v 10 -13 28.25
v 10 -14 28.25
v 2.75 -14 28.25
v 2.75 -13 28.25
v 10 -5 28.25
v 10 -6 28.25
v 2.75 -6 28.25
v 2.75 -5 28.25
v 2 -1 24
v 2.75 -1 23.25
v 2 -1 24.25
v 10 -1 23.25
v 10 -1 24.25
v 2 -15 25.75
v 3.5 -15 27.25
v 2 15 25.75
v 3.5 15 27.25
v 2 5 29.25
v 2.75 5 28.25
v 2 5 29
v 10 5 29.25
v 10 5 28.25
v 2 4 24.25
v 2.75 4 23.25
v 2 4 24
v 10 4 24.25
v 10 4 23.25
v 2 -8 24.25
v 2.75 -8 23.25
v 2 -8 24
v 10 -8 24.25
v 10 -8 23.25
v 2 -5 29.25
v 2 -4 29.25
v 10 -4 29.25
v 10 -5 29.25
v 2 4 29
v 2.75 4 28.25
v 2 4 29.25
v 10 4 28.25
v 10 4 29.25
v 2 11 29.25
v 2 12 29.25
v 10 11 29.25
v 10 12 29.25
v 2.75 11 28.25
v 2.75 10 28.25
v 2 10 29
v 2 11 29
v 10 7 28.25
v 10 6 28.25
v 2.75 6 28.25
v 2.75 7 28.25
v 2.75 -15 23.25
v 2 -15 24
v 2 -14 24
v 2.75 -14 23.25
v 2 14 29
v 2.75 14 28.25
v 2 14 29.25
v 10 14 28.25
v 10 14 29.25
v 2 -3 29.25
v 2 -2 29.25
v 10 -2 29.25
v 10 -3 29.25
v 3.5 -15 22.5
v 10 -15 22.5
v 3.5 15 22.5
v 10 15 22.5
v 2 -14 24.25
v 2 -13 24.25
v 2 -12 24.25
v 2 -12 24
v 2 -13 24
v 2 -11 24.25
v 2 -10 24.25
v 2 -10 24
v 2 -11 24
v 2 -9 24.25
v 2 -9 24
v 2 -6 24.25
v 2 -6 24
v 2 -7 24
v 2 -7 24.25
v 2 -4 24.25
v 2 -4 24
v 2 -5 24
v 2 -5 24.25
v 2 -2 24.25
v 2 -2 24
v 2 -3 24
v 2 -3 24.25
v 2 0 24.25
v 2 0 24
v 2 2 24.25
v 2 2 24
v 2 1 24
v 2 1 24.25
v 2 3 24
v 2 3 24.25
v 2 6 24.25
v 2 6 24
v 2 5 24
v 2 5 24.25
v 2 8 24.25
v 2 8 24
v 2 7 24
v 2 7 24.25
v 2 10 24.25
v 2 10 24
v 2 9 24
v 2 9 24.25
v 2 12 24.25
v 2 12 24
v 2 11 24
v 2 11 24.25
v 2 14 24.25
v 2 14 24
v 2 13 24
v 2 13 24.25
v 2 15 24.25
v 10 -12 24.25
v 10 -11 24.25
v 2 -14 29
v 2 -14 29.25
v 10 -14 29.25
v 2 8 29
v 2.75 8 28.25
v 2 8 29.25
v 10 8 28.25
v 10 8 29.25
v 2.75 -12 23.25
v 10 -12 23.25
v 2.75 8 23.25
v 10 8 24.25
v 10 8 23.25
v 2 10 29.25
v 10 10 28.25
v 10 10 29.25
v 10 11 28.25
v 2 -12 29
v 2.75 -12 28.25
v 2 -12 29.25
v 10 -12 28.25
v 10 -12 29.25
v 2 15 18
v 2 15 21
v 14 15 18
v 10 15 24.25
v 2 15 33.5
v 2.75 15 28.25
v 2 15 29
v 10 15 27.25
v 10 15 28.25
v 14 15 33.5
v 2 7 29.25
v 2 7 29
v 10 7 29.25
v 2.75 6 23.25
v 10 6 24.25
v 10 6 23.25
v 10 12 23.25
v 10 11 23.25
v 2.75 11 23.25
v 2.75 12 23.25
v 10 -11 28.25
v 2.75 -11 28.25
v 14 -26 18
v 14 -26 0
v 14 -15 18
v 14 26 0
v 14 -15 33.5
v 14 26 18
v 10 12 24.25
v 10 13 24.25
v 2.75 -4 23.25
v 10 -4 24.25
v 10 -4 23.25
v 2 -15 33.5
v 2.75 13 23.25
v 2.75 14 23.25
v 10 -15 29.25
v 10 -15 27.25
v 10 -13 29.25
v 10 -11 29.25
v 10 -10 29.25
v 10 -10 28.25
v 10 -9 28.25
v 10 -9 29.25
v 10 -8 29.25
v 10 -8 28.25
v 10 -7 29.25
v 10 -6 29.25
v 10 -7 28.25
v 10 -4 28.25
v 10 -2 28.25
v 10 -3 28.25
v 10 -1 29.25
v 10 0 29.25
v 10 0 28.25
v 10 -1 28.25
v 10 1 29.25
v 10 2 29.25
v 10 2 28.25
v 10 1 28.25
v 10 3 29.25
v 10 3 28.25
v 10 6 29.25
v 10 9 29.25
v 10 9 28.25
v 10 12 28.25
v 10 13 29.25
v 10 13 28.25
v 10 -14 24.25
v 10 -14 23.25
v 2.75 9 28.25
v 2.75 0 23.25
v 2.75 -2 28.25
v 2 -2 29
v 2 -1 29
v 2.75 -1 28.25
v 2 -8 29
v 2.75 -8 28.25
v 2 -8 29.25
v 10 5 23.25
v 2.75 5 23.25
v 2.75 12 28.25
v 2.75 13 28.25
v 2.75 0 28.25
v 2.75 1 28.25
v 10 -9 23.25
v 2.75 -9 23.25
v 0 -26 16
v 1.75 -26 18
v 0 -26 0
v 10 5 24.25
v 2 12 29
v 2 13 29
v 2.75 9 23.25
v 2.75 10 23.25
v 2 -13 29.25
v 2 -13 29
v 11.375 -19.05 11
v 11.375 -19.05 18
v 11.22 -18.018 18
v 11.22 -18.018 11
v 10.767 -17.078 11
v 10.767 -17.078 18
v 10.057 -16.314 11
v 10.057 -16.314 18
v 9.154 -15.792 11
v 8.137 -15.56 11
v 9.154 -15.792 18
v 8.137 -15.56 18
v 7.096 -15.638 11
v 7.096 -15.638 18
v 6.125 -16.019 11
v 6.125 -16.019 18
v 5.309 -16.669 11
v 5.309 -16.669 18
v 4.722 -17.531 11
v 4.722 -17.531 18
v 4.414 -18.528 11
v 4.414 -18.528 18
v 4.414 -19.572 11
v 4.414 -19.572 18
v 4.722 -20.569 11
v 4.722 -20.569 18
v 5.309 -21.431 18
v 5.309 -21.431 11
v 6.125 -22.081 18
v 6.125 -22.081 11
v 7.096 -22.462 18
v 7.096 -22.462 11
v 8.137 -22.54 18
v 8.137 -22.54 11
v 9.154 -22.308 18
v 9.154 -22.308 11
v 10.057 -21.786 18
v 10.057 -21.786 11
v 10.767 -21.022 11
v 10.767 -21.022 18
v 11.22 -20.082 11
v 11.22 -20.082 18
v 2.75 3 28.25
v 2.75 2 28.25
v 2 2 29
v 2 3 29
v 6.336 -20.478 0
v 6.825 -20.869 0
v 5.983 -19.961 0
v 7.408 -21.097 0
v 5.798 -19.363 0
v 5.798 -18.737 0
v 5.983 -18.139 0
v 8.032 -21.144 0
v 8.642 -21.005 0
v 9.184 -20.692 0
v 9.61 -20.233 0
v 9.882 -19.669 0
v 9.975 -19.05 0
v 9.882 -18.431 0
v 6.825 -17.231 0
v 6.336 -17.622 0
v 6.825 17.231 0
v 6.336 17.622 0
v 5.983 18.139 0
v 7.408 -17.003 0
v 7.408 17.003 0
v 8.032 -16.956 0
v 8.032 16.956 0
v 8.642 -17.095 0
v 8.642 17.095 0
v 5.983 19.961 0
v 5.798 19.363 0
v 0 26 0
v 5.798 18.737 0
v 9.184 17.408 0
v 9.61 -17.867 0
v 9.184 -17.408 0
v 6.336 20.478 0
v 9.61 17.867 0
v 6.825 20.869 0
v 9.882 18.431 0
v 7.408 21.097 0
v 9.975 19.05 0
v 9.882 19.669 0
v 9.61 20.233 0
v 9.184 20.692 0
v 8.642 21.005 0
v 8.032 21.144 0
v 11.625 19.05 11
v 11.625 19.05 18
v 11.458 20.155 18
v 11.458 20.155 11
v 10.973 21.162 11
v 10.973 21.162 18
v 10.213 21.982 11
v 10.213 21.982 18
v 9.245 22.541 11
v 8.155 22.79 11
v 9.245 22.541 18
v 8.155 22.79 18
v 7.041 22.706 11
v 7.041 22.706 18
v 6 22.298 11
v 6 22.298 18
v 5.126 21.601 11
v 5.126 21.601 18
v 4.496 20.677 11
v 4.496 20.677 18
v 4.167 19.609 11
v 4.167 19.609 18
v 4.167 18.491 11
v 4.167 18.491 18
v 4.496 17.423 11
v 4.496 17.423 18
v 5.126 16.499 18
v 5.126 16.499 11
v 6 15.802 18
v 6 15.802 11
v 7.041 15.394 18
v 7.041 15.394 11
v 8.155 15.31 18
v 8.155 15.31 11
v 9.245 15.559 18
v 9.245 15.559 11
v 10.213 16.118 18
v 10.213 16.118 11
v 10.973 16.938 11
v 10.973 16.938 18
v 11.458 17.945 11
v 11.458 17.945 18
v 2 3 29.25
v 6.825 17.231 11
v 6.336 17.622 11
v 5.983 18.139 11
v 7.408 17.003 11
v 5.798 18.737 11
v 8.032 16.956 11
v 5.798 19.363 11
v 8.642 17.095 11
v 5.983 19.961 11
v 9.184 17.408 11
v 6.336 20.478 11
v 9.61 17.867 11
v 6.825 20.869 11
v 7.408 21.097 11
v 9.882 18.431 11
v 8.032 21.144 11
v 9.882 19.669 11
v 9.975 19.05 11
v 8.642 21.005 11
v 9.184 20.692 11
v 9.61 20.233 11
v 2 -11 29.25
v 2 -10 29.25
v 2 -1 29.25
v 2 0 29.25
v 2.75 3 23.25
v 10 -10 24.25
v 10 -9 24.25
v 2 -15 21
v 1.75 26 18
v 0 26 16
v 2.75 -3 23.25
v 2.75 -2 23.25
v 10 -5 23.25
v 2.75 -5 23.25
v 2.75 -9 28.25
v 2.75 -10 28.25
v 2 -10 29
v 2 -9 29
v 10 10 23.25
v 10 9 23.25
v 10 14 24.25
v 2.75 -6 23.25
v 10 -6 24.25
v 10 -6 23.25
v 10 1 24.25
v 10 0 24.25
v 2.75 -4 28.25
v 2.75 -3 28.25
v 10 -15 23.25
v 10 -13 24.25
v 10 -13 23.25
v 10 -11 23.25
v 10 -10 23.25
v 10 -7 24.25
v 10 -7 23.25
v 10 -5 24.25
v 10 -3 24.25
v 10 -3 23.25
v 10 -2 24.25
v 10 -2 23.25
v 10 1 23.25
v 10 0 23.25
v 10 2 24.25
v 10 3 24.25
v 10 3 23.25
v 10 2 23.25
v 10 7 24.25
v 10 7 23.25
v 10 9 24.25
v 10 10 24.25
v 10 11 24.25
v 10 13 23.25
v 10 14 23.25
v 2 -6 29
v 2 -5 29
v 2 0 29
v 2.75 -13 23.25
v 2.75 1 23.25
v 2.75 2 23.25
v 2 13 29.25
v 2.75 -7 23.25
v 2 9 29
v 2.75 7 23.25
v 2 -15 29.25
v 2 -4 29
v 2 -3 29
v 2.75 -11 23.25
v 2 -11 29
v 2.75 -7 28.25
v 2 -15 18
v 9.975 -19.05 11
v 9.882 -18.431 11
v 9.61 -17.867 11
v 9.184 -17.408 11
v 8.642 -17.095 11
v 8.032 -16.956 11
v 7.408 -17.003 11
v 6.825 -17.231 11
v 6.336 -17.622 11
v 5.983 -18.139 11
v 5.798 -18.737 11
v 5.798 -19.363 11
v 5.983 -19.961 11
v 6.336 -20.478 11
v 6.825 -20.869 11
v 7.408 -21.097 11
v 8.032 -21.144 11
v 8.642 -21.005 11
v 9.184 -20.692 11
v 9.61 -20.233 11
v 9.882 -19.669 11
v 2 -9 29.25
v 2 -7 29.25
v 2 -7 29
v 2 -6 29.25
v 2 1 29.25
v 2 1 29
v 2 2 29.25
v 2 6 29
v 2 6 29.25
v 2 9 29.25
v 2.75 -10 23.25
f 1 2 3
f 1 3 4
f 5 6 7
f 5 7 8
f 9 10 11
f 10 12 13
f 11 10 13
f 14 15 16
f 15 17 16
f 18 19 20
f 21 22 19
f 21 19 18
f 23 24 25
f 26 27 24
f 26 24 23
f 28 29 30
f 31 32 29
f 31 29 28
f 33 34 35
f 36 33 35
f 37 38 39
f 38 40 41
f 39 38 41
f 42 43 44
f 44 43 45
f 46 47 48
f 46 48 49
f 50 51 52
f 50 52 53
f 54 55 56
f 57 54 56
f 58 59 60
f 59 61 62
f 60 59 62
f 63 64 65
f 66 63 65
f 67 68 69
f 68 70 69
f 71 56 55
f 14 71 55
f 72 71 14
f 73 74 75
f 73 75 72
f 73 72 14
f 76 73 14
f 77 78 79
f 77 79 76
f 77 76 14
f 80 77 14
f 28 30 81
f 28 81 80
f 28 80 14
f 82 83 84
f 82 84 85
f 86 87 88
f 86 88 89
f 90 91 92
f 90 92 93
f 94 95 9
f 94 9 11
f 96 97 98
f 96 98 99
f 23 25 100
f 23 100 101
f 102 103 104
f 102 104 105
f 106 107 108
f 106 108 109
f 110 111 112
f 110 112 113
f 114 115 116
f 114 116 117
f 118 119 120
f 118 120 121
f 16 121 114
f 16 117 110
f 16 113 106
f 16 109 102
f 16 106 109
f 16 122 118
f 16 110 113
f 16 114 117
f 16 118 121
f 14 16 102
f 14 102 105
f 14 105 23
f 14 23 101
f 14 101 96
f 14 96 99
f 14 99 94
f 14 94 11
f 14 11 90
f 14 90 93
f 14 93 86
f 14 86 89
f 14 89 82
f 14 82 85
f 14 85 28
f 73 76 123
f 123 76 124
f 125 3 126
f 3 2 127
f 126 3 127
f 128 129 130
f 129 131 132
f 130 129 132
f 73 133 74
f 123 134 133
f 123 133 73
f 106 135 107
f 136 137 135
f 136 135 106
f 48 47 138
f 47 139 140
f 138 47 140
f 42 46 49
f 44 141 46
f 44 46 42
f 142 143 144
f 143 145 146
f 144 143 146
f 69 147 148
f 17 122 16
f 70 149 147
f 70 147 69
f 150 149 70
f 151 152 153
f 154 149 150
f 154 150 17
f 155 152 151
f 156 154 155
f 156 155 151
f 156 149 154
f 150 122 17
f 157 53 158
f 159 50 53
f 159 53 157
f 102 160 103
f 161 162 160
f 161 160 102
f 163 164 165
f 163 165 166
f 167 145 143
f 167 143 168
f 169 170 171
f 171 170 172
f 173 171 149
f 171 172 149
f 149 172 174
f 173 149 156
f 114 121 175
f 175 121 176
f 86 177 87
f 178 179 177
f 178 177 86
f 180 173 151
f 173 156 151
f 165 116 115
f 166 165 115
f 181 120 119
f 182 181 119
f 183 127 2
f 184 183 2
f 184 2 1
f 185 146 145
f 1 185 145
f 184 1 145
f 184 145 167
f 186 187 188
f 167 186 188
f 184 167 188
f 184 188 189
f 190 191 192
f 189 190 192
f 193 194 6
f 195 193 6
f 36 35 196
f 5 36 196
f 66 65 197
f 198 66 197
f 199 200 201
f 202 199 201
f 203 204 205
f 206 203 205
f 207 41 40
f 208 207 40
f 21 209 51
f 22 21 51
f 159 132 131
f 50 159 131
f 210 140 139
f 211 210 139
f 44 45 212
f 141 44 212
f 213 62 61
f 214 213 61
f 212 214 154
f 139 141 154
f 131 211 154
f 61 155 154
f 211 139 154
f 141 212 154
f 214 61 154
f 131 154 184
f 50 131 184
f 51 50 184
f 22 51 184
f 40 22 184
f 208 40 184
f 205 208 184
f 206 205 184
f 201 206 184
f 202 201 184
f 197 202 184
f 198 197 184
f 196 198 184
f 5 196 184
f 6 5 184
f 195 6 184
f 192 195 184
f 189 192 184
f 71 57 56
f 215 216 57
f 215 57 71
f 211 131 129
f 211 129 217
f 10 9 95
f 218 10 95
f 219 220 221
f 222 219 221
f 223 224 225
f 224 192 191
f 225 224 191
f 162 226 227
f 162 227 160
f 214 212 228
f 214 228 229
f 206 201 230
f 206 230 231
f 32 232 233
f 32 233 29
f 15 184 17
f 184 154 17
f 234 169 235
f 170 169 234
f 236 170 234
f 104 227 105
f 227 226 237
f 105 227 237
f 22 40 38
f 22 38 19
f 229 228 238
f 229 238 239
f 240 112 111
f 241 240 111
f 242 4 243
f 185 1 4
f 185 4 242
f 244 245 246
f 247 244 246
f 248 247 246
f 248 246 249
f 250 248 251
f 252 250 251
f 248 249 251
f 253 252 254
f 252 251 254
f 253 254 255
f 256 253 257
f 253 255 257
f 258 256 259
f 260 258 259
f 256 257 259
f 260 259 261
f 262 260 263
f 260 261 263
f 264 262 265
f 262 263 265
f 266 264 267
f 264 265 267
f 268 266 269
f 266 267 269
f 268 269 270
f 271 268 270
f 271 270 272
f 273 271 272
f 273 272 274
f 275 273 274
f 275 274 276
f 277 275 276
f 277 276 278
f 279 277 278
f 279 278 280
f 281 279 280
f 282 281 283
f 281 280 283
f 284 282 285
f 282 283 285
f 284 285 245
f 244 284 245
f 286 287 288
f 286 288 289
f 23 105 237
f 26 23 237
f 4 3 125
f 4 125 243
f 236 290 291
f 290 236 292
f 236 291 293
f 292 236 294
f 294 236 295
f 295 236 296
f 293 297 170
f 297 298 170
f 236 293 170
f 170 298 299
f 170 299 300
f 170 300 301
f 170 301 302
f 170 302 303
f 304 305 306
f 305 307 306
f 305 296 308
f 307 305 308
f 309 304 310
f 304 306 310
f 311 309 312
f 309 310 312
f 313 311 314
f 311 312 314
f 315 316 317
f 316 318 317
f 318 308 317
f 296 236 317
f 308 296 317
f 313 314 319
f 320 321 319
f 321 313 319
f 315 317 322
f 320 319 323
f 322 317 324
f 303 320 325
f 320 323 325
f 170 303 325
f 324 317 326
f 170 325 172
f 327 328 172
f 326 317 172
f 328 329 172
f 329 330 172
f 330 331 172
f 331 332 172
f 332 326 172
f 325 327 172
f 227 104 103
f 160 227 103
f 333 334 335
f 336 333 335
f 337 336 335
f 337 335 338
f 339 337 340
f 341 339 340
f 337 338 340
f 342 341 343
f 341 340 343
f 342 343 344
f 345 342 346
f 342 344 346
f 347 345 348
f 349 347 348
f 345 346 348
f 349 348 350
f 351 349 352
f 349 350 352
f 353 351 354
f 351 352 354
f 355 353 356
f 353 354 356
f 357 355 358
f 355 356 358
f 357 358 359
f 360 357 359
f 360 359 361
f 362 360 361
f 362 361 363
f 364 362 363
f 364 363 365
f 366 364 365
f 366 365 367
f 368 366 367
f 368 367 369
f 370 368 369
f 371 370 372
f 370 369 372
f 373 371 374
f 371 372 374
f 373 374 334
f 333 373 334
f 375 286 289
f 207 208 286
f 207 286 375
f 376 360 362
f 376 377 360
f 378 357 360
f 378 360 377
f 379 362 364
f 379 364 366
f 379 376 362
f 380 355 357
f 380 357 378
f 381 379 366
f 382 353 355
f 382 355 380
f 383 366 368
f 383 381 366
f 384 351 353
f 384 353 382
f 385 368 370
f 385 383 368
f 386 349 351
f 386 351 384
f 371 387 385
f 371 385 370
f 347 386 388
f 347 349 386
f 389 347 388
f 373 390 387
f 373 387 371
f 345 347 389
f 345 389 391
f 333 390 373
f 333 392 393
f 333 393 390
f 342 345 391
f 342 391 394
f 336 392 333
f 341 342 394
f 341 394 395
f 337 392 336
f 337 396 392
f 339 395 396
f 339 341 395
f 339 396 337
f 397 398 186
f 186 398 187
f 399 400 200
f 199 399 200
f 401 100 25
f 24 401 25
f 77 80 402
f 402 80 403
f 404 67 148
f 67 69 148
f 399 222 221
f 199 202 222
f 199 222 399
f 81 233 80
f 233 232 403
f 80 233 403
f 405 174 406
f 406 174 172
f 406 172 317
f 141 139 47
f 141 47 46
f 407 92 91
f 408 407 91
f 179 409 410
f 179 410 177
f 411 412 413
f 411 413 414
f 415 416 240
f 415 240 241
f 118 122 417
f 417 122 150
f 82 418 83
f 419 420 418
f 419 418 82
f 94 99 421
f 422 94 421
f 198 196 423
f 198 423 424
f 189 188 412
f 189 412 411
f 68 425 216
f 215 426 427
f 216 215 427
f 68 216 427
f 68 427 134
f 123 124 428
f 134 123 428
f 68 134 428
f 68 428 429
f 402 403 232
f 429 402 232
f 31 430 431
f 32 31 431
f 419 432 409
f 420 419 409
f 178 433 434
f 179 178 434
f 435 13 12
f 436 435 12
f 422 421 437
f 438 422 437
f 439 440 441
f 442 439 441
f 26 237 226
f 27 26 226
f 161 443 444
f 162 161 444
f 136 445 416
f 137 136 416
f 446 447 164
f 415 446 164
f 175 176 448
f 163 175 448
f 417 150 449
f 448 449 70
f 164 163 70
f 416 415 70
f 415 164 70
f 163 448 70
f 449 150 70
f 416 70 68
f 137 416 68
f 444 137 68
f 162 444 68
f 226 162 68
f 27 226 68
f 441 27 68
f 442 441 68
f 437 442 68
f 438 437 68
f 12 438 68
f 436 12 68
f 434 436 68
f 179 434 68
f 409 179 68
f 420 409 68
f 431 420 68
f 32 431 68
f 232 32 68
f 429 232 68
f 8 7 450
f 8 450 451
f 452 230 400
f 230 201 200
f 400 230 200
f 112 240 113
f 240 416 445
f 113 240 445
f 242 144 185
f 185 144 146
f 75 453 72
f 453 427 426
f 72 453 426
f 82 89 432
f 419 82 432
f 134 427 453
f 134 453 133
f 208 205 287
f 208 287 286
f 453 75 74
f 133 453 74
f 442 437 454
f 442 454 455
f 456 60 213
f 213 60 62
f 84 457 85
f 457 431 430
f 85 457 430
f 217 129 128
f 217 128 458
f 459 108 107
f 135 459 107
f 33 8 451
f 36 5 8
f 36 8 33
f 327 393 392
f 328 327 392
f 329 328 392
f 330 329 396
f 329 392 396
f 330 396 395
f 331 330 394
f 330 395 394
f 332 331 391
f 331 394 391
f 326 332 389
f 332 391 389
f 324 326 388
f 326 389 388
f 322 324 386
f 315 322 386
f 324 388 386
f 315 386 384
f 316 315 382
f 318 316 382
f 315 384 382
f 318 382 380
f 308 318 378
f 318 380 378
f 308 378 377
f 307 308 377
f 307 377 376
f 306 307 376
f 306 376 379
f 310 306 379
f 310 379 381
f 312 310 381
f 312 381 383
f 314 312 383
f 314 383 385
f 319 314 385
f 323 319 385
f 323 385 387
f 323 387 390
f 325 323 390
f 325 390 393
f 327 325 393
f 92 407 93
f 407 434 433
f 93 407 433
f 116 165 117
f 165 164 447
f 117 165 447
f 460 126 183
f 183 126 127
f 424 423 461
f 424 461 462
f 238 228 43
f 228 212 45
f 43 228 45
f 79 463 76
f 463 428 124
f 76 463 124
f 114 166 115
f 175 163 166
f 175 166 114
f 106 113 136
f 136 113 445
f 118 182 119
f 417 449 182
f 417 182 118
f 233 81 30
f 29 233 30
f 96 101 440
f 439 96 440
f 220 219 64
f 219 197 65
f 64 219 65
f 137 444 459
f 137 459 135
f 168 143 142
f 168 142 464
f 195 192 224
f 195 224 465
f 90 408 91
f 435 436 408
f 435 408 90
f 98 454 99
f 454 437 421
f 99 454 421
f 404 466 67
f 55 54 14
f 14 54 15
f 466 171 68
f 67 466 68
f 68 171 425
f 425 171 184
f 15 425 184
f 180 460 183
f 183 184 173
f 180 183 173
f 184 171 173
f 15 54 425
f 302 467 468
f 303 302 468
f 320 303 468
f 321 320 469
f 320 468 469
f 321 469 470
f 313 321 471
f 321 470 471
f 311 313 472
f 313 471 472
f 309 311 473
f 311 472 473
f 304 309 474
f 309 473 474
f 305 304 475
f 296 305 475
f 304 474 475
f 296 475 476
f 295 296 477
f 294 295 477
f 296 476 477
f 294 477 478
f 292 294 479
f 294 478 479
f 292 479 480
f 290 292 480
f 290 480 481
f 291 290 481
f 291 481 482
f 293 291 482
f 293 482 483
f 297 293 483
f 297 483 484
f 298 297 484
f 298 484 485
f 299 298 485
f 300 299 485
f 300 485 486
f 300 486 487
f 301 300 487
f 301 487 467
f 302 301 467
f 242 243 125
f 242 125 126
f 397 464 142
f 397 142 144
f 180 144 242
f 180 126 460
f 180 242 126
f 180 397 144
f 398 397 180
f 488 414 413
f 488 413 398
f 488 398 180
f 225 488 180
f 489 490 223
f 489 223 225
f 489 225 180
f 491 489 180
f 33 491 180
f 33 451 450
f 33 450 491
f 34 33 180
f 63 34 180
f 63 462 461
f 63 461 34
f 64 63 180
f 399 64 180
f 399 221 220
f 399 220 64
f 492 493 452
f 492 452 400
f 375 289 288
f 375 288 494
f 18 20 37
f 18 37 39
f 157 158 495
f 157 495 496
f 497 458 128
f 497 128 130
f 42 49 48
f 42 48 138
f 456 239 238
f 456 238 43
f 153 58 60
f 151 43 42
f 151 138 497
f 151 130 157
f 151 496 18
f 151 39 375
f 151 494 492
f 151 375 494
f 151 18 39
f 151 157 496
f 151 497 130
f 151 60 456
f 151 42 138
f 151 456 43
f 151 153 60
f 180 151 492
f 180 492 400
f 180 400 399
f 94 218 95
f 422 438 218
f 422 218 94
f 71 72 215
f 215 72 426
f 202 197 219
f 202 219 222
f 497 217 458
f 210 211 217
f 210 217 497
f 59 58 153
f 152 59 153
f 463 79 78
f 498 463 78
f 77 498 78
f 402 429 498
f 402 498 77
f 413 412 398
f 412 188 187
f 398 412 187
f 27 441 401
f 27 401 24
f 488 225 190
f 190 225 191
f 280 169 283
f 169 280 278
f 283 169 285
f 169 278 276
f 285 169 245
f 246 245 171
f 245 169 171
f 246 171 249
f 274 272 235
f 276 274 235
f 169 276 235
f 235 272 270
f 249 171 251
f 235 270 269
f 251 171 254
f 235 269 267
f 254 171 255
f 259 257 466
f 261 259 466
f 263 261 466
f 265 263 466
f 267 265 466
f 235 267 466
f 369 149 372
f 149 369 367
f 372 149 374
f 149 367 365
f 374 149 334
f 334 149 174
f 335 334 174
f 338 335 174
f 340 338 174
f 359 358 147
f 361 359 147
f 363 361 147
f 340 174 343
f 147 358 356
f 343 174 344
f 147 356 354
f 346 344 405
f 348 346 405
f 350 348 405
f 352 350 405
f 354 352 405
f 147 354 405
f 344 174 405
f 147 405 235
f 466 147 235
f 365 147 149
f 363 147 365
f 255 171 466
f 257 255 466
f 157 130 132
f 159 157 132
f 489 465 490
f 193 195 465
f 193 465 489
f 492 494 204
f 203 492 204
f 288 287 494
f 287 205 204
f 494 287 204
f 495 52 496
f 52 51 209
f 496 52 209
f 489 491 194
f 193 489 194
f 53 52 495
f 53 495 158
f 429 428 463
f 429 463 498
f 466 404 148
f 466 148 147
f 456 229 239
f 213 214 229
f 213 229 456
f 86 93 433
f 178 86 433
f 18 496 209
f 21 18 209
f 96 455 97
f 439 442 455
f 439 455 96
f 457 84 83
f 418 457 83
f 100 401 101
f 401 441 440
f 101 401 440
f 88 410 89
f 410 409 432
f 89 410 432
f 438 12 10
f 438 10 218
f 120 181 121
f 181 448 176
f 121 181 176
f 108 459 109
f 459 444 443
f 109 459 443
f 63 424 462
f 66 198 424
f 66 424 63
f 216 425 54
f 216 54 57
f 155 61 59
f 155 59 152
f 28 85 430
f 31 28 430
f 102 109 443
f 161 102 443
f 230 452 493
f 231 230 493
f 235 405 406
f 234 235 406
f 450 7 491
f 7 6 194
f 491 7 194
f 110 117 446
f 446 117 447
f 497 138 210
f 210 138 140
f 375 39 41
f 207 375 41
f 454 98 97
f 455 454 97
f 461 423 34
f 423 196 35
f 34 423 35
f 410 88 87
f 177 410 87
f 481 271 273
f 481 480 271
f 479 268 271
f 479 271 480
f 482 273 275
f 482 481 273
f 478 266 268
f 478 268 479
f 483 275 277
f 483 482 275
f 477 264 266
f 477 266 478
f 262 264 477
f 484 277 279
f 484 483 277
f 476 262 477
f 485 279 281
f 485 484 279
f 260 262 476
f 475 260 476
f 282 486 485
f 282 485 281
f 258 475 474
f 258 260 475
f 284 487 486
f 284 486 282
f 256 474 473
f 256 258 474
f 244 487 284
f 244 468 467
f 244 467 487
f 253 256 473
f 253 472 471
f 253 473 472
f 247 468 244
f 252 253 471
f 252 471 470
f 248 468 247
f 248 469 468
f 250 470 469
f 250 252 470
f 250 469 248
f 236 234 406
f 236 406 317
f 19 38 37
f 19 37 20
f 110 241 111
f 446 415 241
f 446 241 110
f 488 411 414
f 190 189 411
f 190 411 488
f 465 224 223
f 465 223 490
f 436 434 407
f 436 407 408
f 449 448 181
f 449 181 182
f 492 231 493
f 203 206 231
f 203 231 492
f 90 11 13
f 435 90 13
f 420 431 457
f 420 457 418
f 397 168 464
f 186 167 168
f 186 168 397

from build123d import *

# Parameters (mm, degrees)
BOSS_EXTRUDE1_DEPTH        = 26
BOSS_EXTRUDE2_DEPTH        = 15
SKETCH3_W                  = 1
SKETCH3_H                  = 1
BOSS_EXTRUDE3_DEPTH        = 8
CHAMFER1_SIZE              = 0.75
LPATTERN1_COUNT            = 15
LPATTERN1_PITCH            = 2
CHAMFER1_OF_LPATTERN1_SIZE = 0.75
SKETCH5_W                  = 1
SKETCH5_H                  = 1
BOSS_EXTRUDE4_DEPTH        = 8
CHAMFER2_SIZE              = 0.75
LPATTERN2_COUNT            = 15
LPATTERN2_PITCH            = 2
CHAMFER2_OF_LPATTERN2_SIZE = 0.75
SKETCH6_R                  = 2.1
CUT_EXTRUDE1_DEPTH         = 30
SKETCH7_R                  = 3.75
SKETCH7_R_2                = 3.5
CUT_EXTRUDE2_DEPTH         = 7


with BuildPart() as part:
    # Sketch1 → Boss-Extrude1 (new body, symmetric)
    with BuildSketch(Plane(origin=(0, 0, 0), x_dir=(1, 0, 0), z_dir=(0, 1, 0))):
        Polygon((0, 0), (14, 0), (14, -18), (1.75, -18), (0, -16), align=None)
    extrude(amount=BOSS_EXTRUDE1_DEPTH, both=True)

    # Sketch2 → Boss-Extrude2 (add, symmetric)
    with BuildSketch(Plane(origin=(0, 0, 0), x_dir=(1, 0, 0), z_dir=(0, 1, 0))):
        Polygon((14, -18), (14, -33.5), (2, -33.5), (2, -29.25), (10, -29.25), (10, -27.25), (3.5, -27.25), (2, -25.75), (2, -24.25), (10, -24.25), (10, -22.5), (3.5, -22.5), (2, -21), (2, -18), align=None)
    extrude(amount=BOSS_EXTRUDE2_DEPTH, both=True)

    # Sketch3 → Boss-Extrude3 (add)
    with BuildSketch(Plane.ZY.offset(-10)):
        with Locations((28.75, 14.5)):
            Rectangle(SKETCH3_W, SKETCH3_H)
    boss_extrude3 = extrude(amount=BOSS_EXTRUDE3_DEPTH)

    # Chamfer1
    chamfer1_edges = [part.edges().sort_by_distance(p)[0] for p in [
        (2, 14.5, 28.25),
    ]]
    chamfer(chamfer1_edges, length=CHAMFER1_SIZE)

    # LPattern1: Boss-Extrude3 ×15
    with Locations(*[(0, -i * LPATTERN1_PITCH, 0) for i in range(1, LPATTERN1_COUNT)]):
        add(boss_extrude3)

    # Chamfer1 of LPattern1
    chamfer1_of_lpattern1_edges = [part.edges().sort_by_distance(p)[0] for p in [
        (2, 12.5, 28.25),
        (2, 10.5, 28.25),
        (2, 8.5, 28.25),
        (2, 6.5, 28.25),
        (2, 4.5, 28.25),
        (2, 2.5, 28.25),
        (2, 0.5, 28.25),
        (2, -1.5, 28.25),
        (2, -3.5, 28.25),
        (2, -5.5, 28.25),
        (2, -7.5, 28.25),
        (2, -9.5, 28.25),
        (2, -11.5, 28.25),
        (2, -13.5, 28.25),
    ]]
    chamfer(chamfer1_of_lpattern1_edges, length=CHAMFER1_OF_LPATTERN1_SIZE)

    # Sketch5 → Boss-Extrude4 (add)
    with BuildSketch(Plane.ZY.offset(-10)):
        with Locations((23.75, -14.5)):
            Rectangle(SKETCH5_W, SKETCH5_H)
    boss_extrude4 = extrude(amount=BOSS_EXTRUDE4_DEPTH)

    # Chamfer2
    chamfer2_edges = [part.edges().sort_by_distance(p)[0] for p in [
        (2, -14.5, 23.25),
    ]]
    chamfer(chamfer2_edges, length=CHAMFER2_SIZE)

    # LPattern2: Boss-Extrude4 ×15
    with Locations(*[(0, i * LPATTERN2_PITCH, 0) for i in range(1, LPATTERN2_COUNT)]):
        add(boss_extrude4)

    # Chamfer2 of LPattern2
    chamfer2_of_lpattern2_edges = [part.edges().sort_by_distance(p)[0] for p in [
        (2, -12.5, 23.25),
        (2, -10.5, 23.25),
        (2, -8.5, 23.25),
        (2, -6.5, 23.25),
        (2, -4.5, 23.25),
        (2, -2.5, 23.25),
        (2, -0.5, 23.25),
        (2, 1.5, 23.25),
        (2, 3.5, 23.25),
        (2, 5.5, 23.25),
        (2, 7.5, 23.25),
        (2, 9.5, 23.25),
        (2, 11.5, 23.25),
        (2, 13.5, 23.25),
    ]]
    chamfer(chamfer2_of_lpattern2_edges, length=CHAMFER2_OF_LPATTERN2_SIZE)

    # Sketch6 → Cut-Extrude1 (cut)
    with BuildSketch(Plane.XY.offset(18)):
        with Locations((7.875, 19.05)):
            Circle(SKETCH6_R)
        with Locations((7.875, -19.05)):
            Circle(SKETCH6_R)
    extrude(amount=-CUT_EXTRUDE1_DEPTH, mode=Mode.SUBTRACT)

    # Sketch7 → Cut-Extrude2 (cut)
    with BuildSketch(Plane.XY.offset(18)):
        with Locations((7.875, 19.05)):
            Circle(SKETCH7_R)
        with Locations((7.875, -19.05)):
            Circle(SKETCH7_R_2)
    extrude(amount=-CUT_EXTRUDE2_DEPTH, mode=Mode.SUBTRACT)


solid = part.part
